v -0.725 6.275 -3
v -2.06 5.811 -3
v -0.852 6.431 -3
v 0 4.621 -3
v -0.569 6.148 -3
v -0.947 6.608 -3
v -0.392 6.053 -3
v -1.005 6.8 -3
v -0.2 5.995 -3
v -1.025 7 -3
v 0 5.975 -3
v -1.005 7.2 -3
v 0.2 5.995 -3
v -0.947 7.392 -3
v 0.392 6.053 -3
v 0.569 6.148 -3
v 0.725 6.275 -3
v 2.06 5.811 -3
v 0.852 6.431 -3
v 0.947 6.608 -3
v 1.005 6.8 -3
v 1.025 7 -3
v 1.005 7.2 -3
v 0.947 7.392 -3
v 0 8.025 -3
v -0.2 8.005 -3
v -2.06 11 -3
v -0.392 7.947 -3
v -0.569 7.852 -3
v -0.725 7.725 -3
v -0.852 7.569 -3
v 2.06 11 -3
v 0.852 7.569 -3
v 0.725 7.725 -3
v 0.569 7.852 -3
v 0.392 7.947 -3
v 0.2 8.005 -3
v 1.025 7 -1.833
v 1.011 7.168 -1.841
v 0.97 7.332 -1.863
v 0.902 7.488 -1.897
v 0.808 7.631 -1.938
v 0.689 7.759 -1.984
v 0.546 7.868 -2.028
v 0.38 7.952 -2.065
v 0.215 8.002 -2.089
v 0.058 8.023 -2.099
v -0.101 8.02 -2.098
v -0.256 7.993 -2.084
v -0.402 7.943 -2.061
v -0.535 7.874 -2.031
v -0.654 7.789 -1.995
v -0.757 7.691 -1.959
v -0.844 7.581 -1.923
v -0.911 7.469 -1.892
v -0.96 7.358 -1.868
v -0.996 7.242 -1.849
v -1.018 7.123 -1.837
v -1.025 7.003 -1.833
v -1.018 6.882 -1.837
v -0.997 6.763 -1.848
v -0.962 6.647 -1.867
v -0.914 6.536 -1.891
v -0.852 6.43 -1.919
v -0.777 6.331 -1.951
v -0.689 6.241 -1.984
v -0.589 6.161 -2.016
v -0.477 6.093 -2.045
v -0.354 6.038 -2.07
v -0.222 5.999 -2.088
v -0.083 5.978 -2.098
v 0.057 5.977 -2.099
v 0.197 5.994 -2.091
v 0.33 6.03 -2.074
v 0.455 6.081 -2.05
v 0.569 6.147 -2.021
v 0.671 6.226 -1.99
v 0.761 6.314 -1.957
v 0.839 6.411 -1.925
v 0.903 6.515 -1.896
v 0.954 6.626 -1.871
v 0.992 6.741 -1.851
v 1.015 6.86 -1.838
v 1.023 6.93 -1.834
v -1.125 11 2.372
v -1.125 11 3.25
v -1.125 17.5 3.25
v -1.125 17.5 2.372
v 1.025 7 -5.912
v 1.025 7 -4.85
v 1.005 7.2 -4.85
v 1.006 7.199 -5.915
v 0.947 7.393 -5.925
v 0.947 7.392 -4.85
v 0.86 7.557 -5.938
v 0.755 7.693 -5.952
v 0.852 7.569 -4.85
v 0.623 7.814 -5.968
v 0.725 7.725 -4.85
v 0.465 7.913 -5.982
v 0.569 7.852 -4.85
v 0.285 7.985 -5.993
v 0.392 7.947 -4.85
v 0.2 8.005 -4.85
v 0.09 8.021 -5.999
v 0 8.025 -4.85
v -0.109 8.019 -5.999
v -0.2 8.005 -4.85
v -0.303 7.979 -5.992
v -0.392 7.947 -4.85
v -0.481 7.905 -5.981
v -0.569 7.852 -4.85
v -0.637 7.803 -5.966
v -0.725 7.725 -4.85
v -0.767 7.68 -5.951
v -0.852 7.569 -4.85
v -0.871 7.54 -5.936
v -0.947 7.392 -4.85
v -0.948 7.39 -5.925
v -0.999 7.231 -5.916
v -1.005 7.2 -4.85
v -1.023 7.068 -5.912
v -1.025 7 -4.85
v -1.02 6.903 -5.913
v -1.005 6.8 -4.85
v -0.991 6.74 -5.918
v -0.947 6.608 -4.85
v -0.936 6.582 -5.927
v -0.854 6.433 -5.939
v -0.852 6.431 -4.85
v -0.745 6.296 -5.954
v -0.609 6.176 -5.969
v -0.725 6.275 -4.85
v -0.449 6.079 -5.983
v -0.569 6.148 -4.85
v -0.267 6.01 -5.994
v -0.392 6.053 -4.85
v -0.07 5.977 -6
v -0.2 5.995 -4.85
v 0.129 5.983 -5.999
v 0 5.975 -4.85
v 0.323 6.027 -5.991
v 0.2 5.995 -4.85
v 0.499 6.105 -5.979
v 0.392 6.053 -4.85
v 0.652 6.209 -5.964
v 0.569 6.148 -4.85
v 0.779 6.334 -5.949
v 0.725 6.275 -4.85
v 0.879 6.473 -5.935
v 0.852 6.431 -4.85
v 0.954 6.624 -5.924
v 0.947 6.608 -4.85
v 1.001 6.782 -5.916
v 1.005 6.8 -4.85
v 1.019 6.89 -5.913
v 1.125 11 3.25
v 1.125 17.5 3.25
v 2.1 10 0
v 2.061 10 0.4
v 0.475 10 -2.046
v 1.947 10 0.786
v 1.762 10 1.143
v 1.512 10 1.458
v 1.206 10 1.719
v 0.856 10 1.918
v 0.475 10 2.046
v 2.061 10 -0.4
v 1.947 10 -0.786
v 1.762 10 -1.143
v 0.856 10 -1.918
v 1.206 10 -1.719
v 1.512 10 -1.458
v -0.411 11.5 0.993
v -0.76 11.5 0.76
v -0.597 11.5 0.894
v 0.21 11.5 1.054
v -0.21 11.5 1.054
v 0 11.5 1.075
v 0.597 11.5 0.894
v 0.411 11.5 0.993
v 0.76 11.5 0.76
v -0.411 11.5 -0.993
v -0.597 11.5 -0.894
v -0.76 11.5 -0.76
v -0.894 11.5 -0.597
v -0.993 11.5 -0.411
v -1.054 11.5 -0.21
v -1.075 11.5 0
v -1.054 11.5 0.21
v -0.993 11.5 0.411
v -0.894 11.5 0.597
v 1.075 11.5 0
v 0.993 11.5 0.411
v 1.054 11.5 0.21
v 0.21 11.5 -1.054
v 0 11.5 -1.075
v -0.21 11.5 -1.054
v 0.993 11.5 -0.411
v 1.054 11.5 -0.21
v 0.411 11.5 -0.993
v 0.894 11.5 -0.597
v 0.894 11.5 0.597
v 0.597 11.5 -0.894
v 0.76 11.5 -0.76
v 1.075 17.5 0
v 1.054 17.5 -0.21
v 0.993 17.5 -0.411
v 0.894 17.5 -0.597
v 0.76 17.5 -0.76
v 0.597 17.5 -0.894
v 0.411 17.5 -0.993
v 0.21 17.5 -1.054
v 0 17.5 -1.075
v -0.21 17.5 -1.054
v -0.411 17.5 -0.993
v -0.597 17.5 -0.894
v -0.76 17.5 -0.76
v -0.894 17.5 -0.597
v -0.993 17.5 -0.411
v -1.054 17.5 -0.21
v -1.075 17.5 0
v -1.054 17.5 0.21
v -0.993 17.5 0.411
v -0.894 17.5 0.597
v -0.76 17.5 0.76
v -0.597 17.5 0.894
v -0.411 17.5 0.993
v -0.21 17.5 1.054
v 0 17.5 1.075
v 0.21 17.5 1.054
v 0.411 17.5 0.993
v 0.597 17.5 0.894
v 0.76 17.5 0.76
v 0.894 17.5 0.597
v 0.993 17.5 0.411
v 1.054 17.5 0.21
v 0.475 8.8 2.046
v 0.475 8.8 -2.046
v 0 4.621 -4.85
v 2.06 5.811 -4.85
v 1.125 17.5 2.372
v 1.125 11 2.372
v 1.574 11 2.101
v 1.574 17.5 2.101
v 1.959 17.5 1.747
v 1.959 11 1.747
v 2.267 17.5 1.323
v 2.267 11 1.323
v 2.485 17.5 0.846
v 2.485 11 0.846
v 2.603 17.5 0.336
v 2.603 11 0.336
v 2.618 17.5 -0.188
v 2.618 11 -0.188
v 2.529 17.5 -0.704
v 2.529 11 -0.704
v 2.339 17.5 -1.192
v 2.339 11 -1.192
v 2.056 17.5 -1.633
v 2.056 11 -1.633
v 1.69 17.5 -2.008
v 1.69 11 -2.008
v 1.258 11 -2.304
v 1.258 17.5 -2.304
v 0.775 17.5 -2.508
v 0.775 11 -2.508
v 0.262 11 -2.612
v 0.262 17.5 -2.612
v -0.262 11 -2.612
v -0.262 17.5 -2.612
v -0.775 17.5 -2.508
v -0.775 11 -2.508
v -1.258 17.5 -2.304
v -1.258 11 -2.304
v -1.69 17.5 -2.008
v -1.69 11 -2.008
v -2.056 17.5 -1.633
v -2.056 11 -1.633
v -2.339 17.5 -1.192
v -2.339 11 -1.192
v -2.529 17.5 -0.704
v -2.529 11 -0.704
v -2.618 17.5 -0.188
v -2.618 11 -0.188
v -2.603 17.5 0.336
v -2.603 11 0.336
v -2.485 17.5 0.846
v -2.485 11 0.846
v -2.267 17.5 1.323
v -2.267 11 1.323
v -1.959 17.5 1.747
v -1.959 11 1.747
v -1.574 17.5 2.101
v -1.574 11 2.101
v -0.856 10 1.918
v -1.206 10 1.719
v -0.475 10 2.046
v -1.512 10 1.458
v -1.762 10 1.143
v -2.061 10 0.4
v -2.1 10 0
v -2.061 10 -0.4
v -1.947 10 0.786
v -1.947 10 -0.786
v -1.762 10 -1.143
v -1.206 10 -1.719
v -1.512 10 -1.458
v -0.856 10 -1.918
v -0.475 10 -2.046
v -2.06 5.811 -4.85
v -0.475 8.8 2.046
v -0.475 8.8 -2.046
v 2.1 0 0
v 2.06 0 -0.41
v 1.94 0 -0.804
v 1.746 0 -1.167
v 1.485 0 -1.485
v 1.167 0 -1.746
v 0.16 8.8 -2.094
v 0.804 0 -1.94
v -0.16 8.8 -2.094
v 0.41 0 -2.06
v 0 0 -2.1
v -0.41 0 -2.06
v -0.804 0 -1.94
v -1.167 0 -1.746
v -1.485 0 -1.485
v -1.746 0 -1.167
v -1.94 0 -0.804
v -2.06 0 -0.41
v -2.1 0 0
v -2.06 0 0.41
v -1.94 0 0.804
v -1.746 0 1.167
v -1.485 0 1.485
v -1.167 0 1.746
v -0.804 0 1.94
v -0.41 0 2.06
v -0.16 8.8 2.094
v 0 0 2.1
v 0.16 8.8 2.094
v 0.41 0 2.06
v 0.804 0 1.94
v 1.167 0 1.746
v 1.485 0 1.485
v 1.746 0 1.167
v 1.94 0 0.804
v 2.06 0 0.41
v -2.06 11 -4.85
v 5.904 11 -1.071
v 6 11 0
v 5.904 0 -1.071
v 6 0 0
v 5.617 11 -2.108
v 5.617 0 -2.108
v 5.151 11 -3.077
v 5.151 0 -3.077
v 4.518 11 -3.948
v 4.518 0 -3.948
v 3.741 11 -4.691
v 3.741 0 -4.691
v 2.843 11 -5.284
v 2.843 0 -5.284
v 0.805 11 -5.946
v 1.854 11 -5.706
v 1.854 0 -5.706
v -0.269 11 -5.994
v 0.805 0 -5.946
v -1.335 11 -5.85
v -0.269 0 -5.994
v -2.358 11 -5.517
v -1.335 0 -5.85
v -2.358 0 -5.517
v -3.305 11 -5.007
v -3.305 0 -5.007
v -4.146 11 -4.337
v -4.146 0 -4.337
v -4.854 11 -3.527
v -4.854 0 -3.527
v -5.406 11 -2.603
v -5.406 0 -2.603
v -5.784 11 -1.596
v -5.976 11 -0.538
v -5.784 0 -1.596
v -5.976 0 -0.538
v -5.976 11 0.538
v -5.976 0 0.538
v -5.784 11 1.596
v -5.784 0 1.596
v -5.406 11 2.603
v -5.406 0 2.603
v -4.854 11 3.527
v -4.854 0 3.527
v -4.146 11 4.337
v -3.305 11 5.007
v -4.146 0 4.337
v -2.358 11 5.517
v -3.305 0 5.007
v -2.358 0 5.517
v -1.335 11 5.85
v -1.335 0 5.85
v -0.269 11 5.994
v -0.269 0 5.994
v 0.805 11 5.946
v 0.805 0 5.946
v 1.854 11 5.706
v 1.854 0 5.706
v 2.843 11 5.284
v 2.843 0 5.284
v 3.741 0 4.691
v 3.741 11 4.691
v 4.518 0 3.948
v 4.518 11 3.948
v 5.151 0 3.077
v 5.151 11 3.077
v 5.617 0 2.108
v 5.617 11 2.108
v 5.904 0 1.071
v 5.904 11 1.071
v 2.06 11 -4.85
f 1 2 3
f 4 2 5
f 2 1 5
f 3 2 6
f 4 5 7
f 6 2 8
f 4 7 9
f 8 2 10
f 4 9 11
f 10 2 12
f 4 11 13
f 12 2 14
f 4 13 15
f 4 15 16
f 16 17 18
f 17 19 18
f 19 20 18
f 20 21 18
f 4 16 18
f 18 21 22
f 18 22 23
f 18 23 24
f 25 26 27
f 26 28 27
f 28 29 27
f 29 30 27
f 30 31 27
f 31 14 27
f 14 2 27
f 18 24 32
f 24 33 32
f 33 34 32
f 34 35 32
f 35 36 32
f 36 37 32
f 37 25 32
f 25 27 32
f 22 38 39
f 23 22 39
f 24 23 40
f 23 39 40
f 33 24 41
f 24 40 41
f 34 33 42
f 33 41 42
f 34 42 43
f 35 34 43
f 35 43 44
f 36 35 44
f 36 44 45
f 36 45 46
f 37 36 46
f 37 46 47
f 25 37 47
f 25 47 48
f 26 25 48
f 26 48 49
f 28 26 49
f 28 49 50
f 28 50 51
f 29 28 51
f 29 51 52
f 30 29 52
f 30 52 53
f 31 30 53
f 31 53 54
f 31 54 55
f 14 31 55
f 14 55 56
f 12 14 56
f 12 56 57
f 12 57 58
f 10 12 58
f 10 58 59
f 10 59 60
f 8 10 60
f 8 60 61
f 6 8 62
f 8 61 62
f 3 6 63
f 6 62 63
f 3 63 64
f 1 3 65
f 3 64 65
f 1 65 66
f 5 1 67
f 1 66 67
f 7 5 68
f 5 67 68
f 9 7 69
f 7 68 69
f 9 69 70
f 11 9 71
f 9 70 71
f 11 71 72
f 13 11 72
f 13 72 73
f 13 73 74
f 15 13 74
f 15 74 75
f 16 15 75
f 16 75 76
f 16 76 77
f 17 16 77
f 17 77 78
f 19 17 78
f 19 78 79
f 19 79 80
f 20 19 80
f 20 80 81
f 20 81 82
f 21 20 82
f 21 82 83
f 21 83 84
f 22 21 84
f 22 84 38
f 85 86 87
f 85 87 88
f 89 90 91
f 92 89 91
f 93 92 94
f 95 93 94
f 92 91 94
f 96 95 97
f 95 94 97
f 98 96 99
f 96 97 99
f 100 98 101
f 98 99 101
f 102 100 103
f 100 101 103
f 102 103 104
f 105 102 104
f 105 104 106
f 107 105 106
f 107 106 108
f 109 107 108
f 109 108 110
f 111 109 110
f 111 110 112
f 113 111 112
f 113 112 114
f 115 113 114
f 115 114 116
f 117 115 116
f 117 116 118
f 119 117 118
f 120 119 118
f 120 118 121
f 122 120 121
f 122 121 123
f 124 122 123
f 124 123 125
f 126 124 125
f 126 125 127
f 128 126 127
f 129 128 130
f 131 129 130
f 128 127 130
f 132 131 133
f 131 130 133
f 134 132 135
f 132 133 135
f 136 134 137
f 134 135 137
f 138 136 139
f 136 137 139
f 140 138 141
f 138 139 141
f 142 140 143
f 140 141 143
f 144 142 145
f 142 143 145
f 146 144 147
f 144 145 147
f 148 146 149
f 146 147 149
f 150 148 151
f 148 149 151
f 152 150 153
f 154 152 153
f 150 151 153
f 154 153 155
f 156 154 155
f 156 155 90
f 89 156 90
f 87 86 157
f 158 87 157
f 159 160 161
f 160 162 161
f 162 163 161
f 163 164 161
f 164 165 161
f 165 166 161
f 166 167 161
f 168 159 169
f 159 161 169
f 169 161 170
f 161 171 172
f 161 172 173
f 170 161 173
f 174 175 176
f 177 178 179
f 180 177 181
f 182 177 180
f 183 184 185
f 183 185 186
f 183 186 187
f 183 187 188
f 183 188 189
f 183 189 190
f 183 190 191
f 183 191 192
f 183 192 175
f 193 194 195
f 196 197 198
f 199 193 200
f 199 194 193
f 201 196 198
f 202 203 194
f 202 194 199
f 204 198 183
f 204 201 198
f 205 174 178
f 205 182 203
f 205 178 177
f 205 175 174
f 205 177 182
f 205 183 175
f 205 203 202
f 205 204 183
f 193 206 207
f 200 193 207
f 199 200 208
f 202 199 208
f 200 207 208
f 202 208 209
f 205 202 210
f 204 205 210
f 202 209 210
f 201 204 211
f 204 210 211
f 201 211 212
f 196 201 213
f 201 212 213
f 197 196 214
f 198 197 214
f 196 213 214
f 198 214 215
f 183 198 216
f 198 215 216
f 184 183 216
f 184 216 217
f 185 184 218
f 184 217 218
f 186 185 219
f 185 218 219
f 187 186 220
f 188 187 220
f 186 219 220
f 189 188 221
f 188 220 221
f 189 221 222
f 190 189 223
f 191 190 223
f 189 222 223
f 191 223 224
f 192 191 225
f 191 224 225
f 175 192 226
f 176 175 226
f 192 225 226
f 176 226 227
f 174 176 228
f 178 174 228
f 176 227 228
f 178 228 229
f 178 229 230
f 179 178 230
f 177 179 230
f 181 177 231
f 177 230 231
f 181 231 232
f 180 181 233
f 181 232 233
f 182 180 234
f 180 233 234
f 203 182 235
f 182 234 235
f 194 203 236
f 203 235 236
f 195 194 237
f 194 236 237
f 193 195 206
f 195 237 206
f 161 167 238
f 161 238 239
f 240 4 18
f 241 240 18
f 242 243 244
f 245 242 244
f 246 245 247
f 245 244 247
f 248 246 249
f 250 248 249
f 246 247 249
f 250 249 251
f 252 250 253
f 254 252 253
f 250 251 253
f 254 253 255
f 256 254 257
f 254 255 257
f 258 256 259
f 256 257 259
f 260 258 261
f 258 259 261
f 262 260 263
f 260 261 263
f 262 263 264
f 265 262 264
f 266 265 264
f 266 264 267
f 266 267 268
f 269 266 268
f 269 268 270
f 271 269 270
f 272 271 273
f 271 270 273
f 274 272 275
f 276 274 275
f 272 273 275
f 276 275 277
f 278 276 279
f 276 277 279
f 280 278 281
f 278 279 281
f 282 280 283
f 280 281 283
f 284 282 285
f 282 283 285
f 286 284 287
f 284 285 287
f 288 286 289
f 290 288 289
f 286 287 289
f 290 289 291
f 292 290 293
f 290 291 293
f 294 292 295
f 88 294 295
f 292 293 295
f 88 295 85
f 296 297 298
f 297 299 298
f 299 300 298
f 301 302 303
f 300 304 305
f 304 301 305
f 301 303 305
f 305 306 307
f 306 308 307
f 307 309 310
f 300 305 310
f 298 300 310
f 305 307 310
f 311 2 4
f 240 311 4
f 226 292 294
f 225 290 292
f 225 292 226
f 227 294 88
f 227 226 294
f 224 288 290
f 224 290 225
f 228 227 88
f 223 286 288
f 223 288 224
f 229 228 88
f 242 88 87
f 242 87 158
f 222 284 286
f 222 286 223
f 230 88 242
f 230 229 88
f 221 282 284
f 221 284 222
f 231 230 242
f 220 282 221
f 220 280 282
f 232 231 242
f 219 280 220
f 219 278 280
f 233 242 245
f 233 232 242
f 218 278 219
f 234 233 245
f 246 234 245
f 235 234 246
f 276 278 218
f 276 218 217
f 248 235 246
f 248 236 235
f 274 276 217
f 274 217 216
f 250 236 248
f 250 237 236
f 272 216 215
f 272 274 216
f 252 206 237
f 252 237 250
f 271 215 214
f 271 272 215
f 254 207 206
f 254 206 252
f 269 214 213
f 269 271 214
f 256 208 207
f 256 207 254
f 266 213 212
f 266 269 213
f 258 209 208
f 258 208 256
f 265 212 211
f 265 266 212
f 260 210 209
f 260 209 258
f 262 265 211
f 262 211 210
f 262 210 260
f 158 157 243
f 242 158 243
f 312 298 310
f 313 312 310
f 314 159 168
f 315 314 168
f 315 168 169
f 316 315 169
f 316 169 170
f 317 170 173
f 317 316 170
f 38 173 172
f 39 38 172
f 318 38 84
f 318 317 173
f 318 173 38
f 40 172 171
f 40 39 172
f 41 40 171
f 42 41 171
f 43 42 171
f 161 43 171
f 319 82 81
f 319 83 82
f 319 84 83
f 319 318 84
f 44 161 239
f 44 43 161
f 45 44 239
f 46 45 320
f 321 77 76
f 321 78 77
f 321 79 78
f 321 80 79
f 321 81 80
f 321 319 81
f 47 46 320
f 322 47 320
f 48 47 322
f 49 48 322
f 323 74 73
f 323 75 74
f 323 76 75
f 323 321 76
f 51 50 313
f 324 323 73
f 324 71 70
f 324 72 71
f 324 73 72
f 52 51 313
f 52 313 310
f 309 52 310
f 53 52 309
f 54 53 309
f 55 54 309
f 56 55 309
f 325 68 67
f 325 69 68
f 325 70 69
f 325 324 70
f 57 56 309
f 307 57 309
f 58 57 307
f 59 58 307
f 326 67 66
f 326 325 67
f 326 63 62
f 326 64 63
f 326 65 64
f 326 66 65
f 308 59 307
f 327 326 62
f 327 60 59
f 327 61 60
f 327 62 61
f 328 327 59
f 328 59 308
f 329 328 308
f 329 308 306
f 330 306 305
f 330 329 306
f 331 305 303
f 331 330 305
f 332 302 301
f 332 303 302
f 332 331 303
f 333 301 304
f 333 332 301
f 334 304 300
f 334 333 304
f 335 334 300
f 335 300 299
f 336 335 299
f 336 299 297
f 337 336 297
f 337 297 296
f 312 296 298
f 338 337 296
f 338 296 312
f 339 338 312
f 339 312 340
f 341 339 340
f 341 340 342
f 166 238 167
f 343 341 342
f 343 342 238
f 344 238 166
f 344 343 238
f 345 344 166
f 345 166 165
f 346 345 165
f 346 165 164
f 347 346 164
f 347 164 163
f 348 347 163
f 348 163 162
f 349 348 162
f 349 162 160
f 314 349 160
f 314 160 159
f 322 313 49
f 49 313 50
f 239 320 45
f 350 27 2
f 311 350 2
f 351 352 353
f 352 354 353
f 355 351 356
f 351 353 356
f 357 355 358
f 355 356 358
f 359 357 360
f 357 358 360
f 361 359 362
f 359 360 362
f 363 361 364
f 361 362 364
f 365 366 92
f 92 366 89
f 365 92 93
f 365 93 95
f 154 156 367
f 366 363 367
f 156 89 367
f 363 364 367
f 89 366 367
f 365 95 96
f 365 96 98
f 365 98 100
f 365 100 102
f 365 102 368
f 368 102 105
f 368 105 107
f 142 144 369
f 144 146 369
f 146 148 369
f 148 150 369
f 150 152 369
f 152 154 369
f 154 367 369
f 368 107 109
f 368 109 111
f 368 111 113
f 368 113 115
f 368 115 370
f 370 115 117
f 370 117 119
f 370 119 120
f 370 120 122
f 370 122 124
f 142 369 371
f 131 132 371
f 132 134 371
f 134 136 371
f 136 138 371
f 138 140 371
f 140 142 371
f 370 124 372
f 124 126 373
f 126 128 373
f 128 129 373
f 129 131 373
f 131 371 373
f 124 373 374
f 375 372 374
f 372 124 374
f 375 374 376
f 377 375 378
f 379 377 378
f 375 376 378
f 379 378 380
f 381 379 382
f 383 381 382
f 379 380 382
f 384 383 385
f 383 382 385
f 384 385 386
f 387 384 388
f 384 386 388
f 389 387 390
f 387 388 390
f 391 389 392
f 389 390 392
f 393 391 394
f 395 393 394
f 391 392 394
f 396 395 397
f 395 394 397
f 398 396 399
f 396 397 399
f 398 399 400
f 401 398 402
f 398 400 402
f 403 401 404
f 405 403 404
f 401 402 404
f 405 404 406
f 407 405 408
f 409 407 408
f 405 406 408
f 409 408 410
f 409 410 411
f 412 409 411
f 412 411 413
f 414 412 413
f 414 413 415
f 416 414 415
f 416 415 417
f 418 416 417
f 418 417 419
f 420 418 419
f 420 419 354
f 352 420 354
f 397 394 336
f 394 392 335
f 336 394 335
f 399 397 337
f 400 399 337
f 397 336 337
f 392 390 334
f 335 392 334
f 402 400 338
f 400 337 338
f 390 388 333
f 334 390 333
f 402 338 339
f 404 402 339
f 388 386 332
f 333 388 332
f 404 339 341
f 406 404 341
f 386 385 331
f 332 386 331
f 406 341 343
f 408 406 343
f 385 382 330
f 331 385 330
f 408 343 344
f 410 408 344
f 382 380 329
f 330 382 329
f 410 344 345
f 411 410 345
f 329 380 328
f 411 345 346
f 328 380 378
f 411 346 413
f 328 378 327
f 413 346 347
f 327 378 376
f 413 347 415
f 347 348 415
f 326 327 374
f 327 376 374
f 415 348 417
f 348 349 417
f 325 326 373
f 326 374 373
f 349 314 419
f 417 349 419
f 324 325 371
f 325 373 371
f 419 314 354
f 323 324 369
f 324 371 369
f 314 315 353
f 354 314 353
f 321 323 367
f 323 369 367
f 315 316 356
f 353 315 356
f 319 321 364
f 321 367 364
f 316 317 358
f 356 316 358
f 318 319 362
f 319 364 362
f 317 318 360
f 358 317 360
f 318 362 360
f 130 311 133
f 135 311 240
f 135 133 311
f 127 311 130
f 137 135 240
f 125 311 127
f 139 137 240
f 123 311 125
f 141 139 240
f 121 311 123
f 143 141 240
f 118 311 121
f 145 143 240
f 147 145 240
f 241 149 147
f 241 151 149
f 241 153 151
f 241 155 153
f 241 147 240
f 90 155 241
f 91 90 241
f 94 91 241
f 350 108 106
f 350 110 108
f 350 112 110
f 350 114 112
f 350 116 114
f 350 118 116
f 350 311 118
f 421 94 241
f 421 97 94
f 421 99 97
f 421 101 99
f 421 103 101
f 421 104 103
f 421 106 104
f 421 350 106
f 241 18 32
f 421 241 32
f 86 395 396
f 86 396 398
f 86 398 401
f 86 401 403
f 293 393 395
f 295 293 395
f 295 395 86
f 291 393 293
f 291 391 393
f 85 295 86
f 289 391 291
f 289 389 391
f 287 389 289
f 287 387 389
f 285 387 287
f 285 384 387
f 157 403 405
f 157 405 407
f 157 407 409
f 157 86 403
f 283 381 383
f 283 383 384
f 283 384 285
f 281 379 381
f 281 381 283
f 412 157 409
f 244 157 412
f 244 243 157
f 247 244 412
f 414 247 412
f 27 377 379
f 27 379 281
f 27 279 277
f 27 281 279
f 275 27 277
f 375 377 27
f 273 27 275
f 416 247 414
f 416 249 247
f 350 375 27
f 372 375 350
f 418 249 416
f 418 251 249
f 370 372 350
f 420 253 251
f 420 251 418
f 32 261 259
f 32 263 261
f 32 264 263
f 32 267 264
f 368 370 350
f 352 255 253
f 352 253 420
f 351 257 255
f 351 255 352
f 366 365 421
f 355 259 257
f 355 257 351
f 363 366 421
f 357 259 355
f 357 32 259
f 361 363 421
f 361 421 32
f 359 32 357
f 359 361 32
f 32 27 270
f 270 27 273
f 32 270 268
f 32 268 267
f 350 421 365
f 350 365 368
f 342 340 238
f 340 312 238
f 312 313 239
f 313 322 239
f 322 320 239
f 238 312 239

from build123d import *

# Parameters (mm, degrees)
SKETCH1_R           = 6
BOSS_EXTRUDE1_DEPTH = 10
SKETCH2_R           = 1.025
CUT_EXTRUDE1_DEPTH  = 7
SKETCH4_R           = 2.1
CUT_EXTRUDE4_DEPTH  = 11.0000001
SKETCH5_W           = 0.95
SKETCH5_H           = 7.069146706
BOSS_EXTRUDE2_DEPTH = 1.2
SKETCH7_R           = 6
BOSS_EXTRUDE3_DEPTH = 1
SKETCH8_R           = 2.625
SKETCH8_W           = 2.25
SKETCH8_H           = 1.25
BOSS_EXTRUDE4_DEPTH = 6.5
SKETCH9_R           = 1.075
CUT_EXTRUDE5_DEPTH  = 6
CUT_EXTRUDE2_START  = -3
CUT_EXTRUDE2_DEPTH  = 1.85


with BuildPart() as part:
    # Sketch1 → Boss-Extrude1 (new body)
    with BuildSketch(Plane(origin=(0, 0, 0), x_dir=(1, 0, 0), z_dir=(0, 1, 0))):
        Circle(SKETCH1_R)
    extrude(amount=BOSS_EXTRUDE1_DEPTH)

    # Sketch2 → Cut-Extrude1 (cut, through all)
    with BuildSketch(Plane.XY):
        with Locations((0, 7)):
            Circle(SKETCH2_R)
    extrude(amount=-CUT_EXTRUDE1_DEPTH, mode=Mode.SUBTRACT)

    # Sketch4 → Cut-Extrude4 (cut, through all)
    with BuildSketch(Plane(origin=(0, 0, 0), x_dir=(1, 0, 0), z_dir=(0, 1, 0))):
        Circle(SKETCH4_R)
    extrude(amount=CUT_EXTRUDE4_DEPTH, mode=Mode.SUBTRACT)

    # Sketch5 → Boss-Extrude2 (add)
    with BuildSketch(Plane(origin=(0, 10, 0), x_dir=(1, 0, 0), z_dir=(0, 1, 0))):
        Rectangle(SKETCH5_W, SKETCH5_H)
    extrude(amount=-BOSS_EXTRUDE2_DEPTH)

    # Sketch7 → Boss-Extrude3 (add)
    with BuildSketch(Plane(origin=(0, 10, 0), x_dir=(1, 0, 0), z_dir=(0, 1, 0))):
        Circle(SKETCH7_R)
    extrude(amount=BOSS_EXTRUDE3_DEPTH)

    # Sketch8 → Boss-Extrude4 (add)
    with BuildSketch(Plane(origin=(0, 11, 0), x_dir=(1, 0, 0), z_dir=(0, 1, 0))):
        Circle(SKETCH8_R)
        with Locations((0, -2.625)):
            Rectangle(SKETCH8_W, SKETCH8_H)
    extrude(amount=BOSS_EXTRUDE4_DEPTH)

    # Sketch9 → Cut-Extrude5 (cut)
    with BuildSketch(Plane(origin=(0, 17.5, 0), x_dir=(1, 0, 0), z_dir=(0, 1, 0))):
        Circle(SKETCH9_R)
    extrude(amount=-CUT_EXTRUDE5_DEPTH, mode=Mode.SUBTRACT)

    # Sketch3 → Cut-Extrude2 (cut)
    with BuildSketch(Plane.XY.offset(CUT_EXTRUDE2_START)):
        Polygon((0, 4.621316891), (2.06, 5.810658445), (2.06, 8.189341555), (2.06, 11.363105915), (-2.06, 11.363105915), (-2.06, 8.189341555), (-2.06, 5.810658445), align=None)
    extrude(amount=-CUT_EXTRUDE2_DEPTH, mode=Mode.SUBTRACT)


solid = part.part
